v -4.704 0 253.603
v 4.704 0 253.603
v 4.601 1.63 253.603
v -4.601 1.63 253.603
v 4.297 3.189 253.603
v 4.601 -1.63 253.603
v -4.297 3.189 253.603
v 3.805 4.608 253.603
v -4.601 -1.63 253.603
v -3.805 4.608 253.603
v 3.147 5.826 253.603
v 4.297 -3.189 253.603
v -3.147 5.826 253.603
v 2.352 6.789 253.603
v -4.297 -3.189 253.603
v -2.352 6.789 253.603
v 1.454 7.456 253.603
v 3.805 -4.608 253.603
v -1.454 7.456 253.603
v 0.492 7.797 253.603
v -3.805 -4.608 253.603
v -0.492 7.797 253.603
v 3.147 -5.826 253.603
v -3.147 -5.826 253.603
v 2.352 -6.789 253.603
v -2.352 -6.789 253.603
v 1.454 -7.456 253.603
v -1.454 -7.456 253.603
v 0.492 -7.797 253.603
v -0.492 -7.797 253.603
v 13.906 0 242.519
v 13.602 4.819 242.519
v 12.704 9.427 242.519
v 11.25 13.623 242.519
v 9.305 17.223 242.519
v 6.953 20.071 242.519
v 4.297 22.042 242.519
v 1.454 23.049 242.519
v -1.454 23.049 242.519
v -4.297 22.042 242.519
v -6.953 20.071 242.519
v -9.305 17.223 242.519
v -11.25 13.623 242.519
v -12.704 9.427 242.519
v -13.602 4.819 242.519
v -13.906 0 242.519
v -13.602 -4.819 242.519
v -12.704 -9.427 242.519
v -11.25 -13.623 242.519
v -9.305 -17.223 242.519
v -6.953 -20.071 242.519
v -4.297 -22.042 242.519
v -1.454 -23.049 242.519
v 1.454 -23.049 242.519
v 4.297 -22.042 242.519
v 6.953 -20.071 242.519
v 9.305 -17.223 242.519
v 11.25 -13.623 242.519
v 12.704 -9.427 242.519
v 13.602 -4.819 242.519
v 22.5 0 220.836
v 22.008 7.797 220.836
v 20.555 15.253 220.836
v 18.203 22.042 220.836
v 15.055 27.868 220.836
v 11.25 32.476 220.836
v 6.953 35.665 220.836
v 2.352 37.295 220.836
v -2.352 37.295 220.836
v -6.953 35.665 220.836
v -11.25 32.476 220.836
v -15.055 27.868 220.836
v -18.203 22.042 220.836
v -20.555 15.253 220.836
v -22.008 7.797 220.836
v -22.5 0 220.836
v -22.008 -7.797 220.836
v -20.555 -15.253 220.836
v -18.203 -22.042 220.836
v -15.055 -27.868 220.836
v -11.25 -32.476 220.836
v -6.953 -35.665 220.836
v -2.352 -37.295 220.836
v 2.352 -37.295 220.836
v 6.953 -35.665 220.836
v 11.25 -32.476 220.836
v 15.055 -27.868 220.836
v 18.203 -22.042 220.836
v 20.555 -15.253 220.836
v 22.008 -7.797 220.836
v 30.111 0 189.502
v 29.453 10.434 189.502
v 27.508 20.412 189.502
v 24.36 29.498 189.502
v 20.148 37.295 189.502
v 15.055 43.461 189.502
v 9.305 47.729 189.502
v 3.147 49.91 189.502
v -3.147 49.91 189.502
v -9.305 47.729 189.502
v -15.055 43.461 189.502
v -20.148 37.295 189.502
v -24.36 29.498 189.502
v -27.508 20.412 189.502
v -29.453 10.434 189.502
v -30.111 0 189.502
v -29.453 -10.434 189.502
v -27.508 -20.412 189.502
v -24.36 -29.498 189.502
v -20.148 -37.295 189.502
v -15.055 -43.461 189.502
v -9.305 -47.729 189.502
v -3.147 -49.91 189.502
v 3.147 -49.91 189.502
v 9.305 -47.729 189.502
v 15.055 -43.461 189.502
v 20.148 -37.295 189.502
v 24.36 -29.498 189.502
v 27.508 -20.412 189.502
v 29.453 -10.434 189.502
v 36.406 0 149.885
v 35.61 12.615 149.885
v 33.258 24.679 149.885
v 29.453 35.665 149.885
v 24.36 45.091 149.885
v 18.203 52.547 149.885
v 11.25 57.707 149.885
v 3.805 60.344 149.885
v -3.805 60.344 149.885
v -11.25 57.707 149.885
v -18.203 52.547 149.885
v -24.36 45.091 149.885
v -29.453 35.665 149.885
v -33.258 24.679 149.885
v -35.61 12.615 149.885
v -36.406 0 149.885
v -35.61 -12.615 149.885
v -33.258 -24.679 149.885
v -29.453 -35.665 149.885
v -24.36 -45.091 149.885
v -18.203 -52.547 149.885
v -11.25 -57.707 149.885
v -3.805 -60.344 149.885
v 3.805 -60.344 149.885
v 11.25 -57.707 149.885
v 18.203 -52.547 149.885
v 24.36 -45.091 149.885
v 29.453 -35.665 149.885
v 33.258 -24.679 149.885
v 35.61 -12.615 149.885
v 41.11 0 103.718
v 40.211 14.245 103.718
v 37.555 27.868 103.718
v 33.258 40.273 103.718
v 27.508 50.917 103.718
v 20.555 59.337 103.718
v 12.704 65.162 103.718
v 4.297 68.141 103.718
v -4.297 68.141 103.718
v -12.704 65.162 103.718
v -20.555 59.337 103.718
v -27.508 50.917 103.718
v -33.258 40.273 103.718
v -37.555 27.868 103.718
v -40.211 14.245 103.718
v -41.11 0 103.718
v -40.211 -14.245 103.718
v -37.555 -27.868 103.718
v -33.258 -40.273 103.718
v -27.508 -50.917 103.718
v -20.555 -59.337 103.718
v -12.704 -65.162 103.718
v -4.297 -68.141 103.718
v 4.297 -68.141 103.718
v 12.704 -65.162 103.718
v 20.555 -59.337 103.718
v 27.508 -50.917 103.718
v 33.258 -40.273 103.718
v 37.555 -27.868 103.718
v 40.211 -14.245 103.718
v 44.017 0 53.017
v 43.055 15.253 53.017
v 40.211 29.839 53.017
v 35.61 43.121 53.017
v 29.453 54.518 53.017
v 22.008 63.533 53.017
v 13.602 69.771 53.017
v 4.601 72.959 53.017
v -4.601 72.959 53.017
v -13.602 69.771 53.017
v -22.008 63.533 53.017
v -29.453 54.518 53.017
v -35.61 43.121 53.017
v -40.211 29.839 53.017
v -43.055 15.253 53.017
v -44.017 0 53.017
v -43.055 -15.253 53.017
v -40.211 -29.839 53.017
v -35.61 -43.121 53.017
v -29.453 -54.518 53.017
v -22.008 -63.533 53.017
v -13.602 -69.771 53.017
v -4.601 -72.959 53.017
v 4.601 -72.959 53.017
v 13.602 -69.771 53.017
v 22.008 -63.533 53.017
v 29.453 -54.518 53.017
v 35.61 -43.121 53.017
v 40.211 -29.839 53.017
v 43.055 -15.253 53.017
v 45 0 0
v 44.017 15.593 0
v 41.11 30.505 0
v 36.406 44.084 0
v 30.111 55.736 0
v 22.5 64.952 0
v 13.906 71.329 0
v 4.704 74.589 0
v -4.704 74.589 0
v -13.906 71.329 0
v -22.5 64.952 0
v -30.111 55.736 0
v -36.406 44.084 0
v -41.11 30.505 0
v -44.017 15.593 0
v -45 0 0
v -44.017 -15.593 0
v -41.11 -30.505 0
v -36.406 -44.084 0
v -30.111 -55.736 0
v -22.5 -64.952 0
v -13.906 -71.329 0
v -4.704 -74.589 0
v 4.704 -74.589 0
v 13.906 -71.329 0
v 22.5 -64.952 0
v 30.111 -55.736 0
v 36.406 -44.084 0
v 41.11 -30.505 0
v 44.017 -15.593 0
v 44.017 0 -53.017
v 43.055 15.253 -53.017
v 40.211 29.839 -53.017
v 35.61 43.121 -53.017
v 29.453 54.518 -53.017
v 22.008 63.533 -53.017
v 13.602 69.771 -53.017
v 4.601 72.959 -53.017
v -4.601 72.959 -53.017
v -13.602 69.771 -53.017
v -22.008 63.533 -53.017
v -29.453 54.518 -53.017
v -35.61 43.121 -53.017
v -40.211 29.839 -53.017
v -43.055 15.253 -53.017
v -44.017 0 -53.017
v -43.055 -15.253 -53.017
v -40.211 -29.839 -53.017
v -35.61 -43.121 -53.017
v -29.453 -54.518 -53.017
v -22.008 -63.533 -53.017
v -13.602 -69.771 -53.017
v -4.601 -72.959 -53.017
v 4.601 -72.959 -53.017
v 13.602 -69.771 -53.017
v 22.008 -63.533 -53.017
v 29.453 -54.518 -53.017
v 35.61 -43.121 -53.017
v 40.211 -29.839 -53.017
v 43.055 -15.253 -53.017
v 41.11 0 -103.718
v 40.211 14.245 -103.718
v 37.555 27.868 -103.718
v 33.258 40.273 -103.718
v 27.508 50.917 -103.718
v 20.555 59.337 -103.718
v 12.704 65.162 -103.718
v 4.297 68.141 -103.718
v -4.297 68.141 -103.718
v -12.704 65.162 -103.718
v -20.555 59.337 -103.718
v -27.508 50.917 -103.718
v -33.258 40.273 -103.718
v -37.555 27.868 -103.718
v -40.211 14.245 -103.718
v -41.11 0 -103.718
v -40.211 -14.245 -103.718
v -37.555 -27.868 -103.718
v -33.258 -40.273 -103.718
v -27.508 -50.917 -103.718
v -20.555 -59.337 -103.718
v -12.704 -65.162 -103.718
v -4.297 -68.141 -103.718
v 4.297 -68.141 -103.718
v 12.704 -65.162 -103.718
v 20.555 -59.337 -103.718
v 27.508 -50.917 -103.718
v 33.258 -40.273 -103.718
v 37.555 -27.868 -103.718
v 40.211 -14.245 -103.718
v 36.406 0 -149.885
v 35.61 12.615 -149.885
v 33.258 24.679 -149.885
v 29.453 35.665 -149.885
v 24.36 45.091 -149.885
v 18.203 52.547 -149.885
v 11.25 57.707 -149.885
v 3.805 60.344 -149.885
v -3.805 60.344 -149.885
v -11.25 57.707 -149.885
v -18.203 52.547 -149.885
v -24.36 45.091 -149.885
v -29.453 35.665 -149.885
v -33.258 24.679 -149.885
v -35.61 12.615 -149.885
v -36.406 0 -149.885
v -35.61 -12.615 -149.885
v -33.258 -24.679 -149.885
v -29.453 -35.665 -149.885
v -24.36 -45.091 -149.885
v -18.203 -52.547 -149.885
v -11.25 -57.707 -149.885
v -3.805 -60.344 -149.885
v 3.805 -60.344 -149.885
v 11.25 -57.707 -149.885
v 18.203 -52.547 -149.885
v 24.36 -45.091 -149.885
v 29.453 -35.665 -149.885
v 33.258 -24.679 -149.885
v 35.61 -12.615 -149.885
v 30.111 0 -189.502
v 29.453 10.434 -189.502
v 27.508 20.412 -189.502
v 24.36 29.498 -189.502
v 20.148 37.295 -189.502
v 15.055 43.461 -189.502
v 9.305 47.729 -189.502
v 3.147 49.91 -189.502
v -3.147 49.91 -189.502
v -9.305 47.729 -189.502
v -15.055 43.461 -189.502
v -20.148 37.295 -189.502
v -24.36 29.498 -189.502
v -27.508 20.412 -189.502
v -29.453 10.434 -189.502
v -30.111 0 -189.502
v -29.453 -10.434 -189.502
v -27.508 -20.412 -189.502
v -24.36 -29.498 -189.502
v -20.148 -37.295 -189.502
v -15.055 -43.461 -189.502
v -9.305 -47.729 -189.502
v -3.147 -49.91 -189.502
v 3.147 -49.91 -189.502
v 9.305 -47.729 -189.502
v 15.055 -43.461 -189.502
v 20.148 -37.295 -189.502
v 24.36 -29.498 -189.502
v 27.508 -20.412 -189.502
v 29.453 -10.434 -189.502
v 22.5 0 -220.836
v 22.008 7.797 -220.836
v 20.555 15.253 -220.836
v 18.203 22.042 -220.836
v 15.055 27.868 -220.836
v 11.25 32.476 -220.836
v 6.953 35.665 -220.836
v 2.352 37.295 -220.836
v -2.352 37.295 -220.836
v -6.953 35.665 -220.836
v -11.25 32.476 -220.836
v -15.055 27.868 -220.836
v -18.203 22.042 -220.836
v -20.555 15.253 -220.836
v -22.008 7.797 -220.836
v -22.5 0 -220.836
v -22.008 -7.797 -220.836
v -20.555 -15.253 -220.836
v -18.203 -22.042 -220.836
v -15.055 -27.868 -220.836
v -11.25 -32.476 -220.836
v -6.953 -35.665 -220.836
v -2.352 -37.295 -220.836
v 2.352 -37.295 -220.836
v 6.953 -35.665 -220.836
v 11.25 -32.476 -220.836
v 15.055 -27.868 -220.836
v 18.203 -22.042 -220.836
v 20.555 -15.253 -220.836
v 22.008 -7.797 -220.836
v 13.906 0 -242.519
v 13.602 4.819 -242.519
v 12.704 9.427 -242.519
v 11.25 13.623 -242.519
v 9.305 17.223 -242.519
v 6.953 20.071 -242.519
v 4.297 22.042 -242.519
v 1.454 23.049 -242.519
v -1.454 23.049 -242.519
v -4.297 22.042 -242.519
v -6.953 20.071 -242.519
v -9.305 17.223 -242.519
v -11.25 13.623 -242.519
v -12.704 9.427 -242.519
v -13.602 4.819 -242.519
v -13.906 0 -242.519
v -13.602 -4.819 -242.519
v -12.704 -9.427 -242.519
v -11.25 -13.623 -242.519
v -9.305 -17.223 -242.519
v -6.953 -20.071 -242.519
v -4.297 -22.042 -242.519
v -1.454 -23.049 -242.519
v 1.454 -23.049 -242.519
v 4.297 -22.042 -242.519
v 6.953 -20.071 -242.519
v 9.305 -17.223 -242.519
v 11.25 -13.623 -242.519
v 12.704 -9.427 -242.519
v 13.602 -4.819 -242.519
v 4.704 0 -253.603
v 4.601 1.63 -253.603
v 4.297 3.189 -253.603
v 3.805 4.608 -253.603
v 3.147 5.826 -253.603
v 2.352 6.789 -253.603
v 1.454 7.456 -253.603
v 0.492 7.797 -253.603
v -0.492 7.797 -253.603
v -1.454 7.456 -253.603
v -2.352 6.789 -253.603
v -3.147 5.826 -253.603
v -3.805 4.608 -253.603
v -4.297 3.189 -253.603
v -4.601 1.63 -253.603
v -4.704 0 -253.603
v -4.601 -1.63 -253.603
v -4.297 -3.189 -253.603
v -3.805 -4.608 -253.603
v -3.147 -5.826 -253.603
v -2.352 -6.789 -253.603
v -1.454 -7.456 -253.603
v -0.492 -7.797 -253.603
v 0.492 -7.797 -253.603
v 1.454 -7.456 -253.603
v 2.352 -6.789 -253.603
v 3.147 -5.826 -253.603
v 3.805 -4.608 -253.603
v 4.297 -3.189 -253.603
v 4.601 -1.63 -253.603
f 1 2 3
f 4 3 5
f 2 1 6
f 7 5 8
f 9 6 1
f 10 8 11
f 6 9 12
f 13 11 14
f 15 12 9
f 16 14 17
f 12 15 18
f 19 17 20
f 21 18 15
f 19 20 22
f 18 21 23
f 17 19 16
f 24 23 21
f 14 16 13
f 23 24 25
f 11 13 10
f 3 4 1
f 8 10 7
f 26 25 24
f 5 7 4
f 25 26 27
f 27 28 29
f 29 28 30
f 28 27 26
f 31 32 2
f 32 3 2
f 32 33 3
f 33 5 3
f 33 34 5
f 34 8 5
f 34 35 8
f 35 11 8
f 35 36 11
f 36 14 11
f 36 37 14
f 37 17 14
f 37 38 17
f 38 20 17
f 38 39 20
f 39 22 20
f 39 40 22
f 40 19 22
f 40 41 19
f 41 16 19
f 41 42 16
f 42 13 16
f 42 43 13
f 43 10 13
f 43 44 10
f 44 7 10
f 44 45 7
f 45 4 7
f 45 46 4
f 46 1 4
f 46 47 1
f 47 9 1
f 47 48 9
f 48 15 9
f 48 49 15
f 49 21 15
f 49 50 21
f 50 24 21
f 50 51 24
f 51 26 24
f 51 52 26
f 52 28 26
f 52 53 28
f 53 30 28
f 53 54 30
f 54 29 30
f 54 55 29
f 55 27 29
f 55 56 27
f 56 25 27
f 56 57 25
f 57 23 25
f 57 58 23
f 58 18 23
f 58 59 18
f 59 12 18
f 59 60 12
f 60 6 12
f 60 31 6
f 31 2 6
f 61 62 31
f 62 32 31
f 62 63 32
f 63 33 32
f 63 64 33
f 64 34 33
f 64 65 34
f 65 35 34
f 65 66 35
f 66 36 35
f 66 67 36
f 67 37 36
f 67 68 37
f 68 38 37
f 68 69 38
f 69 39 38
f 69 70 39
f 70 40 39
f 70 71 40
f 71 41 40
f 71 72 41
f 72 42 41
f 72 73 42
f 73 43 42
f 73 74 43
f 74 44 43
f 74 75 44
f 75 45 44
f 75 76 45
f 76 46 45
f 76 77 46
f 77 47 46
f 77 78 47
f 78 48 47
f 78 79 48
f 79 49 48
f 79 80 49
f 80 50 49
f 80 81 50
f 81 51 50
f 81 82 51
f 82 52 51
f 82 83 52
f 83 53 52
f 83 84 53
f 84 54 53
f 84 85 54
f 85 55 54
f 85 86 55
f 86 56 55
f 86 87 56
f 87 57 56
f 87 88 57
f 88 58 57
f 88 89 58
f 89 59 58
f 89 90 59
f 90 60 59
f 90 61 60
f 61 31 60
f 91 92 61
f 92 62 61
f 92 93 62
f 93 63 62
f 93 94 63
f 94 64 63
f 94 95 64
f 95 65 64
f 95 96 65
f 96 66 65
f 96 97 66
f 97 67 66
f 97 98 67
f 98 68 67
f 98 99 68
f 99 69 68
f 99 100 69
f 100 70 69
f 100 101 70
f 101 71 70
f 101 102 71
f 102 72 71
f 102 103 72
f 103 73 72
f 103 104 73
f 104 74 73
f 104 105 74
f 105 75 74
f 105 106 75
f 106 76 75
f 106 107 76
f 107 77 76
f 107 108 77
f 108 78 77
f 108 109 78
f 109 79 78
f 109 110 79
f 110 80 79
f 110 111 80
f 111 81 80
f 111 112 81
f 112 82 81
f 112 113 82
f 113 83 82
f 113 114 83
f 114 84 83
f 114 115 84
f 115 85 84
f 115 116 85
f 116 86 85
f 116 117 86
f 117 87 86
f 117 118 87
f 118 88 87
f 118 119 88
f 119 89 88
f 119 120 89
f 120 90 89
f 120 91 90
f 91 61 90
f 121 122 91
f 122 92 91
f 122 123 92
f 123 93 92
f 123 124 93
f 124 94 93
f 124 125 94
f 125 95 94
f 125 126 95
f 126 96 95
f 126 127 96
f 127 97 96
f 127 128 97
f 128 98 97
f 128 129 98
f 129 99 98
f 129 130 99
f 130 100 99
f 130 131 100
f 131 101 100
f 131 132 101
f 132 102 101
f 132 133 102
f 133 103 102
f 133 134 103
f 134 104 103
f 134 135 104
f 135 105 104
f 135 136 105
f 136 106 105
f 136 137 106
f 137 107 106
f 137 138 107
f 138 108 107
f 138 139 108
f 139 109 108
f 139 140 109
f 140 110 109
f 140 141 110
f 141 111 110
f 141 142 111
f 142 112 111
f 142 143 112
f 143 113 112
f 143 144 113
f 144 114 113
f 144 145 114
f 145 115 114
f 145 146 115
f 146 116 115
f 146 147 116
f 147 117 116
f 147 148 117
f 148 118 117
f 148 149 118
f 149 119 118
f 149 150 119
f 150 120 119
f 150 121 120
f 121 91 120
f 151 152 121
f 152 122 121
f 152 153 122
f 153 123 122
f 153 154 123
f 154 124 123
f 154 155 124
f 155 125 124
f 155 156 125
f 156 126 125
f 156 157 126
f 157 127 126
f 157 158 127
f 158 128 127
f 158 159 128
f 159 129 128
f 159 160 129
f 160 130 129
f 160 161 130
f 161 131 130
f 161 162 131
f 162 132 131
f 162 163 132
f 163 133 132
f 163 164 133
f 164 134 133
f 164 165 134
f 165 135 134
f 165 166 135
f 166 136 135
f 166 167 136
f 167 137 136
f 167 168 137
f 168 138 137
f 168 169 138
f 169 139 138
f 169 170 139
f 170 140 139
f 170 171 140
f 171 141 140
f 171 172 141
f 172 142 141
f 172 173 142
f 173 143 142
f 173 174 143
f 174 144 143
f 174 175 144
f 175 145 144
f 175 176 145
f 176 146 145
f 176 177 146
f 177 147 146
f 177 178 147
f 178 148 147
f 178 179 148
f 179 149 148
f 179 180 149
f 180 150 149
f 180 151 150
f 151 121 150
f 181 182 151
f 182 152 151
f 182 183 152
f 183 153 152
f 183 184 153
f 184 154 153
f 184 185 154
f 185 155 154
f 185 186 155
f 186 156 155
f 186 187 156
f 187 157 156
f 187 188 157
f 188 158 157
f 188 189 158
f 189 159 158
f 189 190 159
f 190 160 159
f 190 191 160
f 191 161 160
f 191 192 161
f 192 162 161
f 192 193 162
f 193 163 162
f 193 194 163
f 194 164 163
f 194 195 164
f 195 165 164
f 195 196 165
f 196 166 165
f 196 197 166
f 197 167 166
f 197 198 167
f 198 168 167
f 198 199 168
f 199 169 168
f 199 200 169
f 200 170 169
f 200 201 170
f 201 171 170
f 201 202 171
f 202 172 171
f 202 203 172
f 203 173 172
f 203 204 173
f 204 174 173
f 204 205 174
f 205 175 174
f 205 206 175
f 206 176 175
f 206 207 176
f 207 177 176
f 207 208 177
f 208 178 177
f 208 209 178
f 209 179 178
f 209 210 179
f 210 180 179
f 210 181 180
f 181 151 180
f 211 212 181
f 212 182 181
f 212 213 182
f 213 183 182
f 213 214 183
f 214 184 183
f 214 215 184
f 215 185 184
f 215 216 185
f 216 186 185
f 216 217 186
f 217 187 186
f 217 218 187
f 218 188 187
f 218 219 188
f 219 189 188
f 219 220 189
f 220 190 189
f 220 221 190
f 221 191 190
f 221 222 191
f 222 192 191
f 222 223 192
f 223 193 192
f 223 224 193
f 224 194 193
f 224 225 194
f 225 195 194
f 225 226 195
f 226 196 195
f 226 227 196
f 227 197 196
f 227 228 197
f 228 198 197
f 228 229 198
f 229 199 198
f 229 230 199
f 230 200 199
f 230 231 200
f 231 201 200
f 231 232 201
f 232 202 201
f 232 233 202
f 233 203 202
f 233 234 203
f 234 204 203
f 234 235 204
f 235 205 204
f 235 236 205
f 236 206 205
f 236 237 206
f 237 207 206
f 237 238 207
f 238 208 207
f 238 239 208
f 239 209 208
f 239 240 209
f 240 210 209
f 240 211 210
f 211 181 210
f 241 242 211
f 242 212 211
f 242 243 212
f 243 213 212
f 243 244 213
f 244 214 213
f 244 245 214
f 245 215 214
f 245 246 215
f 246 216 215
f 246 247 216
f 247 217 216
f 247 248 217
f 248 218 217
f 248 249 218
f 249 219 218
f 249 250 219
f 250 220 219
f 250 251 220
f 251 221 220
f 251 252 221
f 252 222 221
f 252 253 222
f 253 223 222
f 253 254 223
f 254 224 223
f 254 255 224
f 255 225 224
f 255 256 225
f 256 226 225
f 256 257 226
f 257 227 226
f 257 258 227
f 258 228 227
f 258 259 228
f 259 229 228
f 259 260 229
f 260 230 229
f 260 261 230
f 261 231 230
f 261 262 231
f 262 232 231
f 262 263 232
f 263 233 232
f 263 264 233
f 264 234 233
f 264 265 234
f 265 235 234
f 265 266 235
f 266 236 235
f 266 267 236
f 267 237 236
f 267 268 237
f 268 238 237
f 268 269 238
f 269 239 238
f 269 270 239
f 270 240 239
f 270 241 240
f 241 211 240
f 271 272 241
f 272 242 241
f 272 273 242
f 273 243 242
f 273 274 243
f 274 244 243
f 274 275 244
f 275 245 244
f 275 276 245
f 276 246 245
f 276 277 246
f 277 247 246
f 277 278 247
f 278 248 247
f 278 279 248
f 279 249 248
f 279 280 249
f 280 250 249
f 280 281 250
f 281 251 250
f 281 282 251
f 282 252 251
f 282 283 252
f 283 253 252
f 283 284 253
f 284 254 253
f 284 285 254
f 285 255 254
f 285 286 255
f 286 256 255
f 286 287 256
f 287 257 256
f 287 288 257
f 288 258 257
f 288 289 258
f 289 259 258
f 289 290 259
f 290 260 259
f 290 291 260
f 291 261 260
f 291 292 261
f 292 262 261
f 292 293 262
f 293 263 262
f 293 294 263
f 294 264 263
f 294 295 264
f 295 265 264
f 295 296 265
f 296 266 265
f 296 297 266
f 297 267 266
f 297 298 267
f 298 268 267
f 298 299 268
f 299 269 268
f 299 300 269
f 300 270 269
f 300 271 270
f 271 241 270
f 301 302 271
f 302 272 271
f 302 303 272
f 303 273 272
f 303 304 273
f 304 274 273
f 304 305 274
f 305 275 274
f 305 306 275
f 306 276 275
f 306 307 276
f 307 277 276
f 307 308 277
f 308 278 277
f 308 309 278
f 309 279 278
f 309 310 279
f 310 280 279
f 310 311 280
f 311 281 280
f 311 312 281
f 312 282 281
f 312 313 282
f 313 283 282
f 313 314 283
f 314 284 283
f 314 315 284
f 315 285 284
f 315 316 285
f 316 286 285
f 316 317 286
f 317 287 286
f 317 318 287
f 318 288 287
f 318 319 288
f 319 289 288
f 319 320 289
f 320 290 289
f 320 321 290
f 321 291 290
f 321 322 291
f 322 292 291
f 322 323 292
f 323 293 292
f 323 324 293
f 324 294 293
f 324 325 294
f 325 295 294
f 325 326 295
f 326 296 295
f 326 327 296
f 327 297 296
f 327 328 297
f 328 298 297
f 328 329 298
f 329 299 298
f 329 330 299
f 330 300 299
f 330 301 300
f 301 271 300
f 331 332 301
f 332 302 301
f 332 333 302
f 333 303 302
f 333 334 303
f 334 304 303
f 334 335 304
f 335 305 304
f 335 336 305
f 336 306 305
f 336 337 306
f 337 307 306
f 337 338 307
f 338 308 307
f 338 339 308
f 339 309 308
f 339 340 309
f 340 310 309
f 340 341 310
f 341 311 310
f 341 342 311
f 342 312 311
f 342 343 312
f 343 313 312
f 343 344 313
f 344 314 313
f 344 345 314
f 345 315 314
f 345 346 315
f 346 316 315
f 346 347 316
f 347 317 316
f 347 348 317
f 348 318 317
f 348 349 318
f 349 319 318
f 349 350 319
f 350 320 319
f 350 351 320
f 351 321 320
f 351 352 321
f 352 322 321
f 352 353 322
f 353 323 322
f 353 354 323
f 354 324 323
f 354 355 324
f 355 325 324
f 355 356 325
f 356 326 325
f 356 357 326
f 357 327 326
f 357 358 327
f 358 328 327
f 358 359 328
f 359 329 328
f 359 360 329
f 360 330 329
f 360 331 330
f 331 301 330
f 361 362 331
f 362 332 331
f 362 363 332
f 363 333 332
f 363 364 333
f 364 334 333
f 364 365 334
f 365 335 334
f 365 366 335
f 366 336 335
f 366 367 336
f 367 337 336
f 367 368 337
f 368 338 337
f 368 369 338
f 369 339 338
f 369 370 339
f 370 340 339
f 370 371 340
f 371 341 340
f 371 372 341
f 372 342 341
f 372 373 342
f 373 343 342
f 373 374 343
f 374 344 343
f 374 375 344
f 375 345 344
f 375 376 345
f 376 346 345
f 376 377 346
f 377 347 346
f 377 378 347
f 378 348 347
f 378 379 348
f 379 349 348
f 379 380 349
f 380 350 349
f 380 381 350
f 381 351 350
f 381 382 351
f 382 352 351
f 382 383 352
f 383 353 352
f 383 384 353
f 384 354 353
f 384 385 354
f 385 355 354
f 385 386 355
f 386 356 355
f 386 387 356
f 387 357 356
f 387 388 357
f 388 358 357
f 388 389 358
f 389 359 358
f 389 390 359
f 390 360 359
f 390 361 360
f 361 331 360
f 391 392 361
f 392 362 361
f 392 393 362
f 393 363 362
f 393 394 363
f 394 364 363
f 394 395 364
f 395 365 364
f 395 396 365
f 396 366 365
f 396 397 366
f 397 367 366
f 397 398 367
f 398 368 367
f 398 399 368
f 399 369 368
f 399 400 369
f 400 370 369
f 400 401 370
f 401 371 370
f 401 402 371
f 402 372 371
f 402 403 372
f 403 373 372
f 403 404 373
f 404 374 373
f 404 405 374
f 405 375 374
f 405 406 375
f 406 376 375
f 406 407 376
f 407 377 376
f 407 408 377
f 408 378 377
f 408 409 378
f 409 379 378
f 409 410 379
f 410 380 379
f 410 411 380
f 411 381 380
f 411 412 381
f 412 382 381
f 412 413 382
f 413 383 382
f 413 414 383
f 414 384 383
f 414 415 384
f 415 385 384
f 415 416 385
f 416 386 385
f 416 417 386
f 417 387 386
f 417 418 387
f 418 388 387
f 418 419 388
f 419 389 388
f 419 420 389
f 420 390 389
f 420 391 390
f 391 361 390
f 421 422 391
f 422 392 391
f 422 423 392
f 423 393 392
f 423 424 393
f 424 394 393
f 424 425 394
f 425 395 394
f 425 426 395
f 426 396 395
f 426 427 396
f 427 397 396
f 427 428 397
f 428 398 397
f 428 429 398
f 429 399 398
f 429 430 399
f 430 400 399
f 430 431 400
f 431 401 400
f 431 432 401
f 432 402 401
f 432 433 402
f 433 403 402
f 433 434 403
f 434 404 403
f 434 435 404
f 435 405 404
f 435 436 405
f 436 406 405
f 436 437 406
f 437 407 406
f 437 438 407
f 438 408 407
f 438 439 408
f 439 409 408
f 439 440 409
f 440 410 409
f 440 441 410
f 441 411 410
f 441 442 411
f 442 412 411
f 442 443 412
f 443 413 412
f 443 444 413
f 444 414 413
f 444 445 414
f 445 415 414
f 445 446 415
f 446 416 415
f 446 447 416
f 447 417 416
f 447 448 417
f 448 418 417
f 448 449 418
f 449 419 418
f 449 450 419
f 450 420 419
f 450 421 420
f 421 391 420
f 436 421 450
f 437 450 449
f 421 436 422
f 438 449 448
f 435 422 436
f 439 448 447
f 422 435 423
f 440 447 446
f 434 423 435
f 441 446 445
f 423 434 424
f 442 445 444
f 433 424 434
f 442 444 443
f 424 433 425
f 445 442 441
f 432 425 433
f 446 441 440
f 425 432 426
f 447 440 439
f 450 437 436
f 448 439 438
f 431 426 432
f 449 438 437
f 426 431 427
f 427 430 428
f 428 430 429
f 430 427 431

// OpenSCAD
// Generated by SolidPython 1.0.1 on 2020-07-29 00:46:45


scale(v = [3, 5, 17]) {
	sphere(r = 15);
}
/***********************************************
*********      SolidPython code:      **********
************************************************
 
# import packages: SolidPython
from solid import *
from solid.utils import *
from itertools import chain, combinations, permutations


class Resize:

    def __init__(self, scad_file):
        self.scad_file = scad_file
        #self.scad_file = import_scad(scad_file)
        # cone/cylinder param:
        self.r1 = 0
        self.r2 = 0
        self.h = 0
        # rectangular prism param:
        self.w = 0
        self.l = 0
        # ellipse param:
        self.r = 0

    # import OpenScad code (file name corresponds to shape)


    # classify shape + parameters
    def assign(self, param1, param2, param3):
        if self.scad_file == 'cone.scad':
            self.r1 = param1
            self.r2 = param2
            self.h = param3
        elif self.scad_file == 'cylinder.scad':
            self.r1 = param1
            self.r2 = param2
            self.h = param3
        elif self.scad_file == 'rectangularPrism.scad':
            self.h = param1
            self.l = param2
            self.w = param3
        else:
            self.r = param1
            self.h = param2

    # resize parameters
    def iterate(self):
        x = range(3, 20, 2)
        i = 1
        if self.scad_file == 'cone.scad':
            tempList = list(permutations(x, 2))
            for temp in tempList:
                param1 = temp[0]
                param2 = temp[1]
                filepath = 'produced_scad_files/' + 'cone' + str(param1) + '_' + str(param2) + '_' + '.scad'
                scad_render_to_file(cylinder(h=param1, r1=param2, r2=0), filepath)

        elif self.scad_file == 'cylinder.scad':
            tempList = list(permutations(x, 3))
            for temp in tempList:
                param1 = temp[0]
                param2 = temp[1]
                filepath = 'produced_scad_files/' + 'cylinder' + str(param1) + '_' + str(param2) + '_' + '.scad'
                scad_render_to_file(cylinder(h=param1, r1=param2, r2=param2), filepath)

        elif self.scad_file == 'rectangularPrism.scad':
            tempList = list(permutations(x, 3))
            for temp in tempList:
                param1 = temp[0]
                param2 = temp[1]
                param3 = temp[2]
                filepath = 'produced_scad_files/' + 'rectangularPrism' + str(param1) + '_' + str(param2) + '_' + str(
                    param3) + '.scad'
                scad_render_to_file(cube(size=(param1, param2, param3)), filepath)

        elif self.scad_file == 'ellipse.scad':
            tempList = list(permutations(x, 4))
            for temp in tempList:
                param1 = temp[0]
                param2 = temp[1]
                param3 = temp[2]
                param4 = temp[3]
                filepath = 'produced_scad_files/' + 'ellipse' + str(param1) + '_' + str(param2) + '_' + str(param3) + '_' + str(param4) + '.scad'
                scad_render_to_file(scale([param1, param2, param3])(sphere(r=param4)), filepath)

    def render_to_scadfile(self):
        scad_render_to_file(scad, 'example.scad') 
 
************************************************/
